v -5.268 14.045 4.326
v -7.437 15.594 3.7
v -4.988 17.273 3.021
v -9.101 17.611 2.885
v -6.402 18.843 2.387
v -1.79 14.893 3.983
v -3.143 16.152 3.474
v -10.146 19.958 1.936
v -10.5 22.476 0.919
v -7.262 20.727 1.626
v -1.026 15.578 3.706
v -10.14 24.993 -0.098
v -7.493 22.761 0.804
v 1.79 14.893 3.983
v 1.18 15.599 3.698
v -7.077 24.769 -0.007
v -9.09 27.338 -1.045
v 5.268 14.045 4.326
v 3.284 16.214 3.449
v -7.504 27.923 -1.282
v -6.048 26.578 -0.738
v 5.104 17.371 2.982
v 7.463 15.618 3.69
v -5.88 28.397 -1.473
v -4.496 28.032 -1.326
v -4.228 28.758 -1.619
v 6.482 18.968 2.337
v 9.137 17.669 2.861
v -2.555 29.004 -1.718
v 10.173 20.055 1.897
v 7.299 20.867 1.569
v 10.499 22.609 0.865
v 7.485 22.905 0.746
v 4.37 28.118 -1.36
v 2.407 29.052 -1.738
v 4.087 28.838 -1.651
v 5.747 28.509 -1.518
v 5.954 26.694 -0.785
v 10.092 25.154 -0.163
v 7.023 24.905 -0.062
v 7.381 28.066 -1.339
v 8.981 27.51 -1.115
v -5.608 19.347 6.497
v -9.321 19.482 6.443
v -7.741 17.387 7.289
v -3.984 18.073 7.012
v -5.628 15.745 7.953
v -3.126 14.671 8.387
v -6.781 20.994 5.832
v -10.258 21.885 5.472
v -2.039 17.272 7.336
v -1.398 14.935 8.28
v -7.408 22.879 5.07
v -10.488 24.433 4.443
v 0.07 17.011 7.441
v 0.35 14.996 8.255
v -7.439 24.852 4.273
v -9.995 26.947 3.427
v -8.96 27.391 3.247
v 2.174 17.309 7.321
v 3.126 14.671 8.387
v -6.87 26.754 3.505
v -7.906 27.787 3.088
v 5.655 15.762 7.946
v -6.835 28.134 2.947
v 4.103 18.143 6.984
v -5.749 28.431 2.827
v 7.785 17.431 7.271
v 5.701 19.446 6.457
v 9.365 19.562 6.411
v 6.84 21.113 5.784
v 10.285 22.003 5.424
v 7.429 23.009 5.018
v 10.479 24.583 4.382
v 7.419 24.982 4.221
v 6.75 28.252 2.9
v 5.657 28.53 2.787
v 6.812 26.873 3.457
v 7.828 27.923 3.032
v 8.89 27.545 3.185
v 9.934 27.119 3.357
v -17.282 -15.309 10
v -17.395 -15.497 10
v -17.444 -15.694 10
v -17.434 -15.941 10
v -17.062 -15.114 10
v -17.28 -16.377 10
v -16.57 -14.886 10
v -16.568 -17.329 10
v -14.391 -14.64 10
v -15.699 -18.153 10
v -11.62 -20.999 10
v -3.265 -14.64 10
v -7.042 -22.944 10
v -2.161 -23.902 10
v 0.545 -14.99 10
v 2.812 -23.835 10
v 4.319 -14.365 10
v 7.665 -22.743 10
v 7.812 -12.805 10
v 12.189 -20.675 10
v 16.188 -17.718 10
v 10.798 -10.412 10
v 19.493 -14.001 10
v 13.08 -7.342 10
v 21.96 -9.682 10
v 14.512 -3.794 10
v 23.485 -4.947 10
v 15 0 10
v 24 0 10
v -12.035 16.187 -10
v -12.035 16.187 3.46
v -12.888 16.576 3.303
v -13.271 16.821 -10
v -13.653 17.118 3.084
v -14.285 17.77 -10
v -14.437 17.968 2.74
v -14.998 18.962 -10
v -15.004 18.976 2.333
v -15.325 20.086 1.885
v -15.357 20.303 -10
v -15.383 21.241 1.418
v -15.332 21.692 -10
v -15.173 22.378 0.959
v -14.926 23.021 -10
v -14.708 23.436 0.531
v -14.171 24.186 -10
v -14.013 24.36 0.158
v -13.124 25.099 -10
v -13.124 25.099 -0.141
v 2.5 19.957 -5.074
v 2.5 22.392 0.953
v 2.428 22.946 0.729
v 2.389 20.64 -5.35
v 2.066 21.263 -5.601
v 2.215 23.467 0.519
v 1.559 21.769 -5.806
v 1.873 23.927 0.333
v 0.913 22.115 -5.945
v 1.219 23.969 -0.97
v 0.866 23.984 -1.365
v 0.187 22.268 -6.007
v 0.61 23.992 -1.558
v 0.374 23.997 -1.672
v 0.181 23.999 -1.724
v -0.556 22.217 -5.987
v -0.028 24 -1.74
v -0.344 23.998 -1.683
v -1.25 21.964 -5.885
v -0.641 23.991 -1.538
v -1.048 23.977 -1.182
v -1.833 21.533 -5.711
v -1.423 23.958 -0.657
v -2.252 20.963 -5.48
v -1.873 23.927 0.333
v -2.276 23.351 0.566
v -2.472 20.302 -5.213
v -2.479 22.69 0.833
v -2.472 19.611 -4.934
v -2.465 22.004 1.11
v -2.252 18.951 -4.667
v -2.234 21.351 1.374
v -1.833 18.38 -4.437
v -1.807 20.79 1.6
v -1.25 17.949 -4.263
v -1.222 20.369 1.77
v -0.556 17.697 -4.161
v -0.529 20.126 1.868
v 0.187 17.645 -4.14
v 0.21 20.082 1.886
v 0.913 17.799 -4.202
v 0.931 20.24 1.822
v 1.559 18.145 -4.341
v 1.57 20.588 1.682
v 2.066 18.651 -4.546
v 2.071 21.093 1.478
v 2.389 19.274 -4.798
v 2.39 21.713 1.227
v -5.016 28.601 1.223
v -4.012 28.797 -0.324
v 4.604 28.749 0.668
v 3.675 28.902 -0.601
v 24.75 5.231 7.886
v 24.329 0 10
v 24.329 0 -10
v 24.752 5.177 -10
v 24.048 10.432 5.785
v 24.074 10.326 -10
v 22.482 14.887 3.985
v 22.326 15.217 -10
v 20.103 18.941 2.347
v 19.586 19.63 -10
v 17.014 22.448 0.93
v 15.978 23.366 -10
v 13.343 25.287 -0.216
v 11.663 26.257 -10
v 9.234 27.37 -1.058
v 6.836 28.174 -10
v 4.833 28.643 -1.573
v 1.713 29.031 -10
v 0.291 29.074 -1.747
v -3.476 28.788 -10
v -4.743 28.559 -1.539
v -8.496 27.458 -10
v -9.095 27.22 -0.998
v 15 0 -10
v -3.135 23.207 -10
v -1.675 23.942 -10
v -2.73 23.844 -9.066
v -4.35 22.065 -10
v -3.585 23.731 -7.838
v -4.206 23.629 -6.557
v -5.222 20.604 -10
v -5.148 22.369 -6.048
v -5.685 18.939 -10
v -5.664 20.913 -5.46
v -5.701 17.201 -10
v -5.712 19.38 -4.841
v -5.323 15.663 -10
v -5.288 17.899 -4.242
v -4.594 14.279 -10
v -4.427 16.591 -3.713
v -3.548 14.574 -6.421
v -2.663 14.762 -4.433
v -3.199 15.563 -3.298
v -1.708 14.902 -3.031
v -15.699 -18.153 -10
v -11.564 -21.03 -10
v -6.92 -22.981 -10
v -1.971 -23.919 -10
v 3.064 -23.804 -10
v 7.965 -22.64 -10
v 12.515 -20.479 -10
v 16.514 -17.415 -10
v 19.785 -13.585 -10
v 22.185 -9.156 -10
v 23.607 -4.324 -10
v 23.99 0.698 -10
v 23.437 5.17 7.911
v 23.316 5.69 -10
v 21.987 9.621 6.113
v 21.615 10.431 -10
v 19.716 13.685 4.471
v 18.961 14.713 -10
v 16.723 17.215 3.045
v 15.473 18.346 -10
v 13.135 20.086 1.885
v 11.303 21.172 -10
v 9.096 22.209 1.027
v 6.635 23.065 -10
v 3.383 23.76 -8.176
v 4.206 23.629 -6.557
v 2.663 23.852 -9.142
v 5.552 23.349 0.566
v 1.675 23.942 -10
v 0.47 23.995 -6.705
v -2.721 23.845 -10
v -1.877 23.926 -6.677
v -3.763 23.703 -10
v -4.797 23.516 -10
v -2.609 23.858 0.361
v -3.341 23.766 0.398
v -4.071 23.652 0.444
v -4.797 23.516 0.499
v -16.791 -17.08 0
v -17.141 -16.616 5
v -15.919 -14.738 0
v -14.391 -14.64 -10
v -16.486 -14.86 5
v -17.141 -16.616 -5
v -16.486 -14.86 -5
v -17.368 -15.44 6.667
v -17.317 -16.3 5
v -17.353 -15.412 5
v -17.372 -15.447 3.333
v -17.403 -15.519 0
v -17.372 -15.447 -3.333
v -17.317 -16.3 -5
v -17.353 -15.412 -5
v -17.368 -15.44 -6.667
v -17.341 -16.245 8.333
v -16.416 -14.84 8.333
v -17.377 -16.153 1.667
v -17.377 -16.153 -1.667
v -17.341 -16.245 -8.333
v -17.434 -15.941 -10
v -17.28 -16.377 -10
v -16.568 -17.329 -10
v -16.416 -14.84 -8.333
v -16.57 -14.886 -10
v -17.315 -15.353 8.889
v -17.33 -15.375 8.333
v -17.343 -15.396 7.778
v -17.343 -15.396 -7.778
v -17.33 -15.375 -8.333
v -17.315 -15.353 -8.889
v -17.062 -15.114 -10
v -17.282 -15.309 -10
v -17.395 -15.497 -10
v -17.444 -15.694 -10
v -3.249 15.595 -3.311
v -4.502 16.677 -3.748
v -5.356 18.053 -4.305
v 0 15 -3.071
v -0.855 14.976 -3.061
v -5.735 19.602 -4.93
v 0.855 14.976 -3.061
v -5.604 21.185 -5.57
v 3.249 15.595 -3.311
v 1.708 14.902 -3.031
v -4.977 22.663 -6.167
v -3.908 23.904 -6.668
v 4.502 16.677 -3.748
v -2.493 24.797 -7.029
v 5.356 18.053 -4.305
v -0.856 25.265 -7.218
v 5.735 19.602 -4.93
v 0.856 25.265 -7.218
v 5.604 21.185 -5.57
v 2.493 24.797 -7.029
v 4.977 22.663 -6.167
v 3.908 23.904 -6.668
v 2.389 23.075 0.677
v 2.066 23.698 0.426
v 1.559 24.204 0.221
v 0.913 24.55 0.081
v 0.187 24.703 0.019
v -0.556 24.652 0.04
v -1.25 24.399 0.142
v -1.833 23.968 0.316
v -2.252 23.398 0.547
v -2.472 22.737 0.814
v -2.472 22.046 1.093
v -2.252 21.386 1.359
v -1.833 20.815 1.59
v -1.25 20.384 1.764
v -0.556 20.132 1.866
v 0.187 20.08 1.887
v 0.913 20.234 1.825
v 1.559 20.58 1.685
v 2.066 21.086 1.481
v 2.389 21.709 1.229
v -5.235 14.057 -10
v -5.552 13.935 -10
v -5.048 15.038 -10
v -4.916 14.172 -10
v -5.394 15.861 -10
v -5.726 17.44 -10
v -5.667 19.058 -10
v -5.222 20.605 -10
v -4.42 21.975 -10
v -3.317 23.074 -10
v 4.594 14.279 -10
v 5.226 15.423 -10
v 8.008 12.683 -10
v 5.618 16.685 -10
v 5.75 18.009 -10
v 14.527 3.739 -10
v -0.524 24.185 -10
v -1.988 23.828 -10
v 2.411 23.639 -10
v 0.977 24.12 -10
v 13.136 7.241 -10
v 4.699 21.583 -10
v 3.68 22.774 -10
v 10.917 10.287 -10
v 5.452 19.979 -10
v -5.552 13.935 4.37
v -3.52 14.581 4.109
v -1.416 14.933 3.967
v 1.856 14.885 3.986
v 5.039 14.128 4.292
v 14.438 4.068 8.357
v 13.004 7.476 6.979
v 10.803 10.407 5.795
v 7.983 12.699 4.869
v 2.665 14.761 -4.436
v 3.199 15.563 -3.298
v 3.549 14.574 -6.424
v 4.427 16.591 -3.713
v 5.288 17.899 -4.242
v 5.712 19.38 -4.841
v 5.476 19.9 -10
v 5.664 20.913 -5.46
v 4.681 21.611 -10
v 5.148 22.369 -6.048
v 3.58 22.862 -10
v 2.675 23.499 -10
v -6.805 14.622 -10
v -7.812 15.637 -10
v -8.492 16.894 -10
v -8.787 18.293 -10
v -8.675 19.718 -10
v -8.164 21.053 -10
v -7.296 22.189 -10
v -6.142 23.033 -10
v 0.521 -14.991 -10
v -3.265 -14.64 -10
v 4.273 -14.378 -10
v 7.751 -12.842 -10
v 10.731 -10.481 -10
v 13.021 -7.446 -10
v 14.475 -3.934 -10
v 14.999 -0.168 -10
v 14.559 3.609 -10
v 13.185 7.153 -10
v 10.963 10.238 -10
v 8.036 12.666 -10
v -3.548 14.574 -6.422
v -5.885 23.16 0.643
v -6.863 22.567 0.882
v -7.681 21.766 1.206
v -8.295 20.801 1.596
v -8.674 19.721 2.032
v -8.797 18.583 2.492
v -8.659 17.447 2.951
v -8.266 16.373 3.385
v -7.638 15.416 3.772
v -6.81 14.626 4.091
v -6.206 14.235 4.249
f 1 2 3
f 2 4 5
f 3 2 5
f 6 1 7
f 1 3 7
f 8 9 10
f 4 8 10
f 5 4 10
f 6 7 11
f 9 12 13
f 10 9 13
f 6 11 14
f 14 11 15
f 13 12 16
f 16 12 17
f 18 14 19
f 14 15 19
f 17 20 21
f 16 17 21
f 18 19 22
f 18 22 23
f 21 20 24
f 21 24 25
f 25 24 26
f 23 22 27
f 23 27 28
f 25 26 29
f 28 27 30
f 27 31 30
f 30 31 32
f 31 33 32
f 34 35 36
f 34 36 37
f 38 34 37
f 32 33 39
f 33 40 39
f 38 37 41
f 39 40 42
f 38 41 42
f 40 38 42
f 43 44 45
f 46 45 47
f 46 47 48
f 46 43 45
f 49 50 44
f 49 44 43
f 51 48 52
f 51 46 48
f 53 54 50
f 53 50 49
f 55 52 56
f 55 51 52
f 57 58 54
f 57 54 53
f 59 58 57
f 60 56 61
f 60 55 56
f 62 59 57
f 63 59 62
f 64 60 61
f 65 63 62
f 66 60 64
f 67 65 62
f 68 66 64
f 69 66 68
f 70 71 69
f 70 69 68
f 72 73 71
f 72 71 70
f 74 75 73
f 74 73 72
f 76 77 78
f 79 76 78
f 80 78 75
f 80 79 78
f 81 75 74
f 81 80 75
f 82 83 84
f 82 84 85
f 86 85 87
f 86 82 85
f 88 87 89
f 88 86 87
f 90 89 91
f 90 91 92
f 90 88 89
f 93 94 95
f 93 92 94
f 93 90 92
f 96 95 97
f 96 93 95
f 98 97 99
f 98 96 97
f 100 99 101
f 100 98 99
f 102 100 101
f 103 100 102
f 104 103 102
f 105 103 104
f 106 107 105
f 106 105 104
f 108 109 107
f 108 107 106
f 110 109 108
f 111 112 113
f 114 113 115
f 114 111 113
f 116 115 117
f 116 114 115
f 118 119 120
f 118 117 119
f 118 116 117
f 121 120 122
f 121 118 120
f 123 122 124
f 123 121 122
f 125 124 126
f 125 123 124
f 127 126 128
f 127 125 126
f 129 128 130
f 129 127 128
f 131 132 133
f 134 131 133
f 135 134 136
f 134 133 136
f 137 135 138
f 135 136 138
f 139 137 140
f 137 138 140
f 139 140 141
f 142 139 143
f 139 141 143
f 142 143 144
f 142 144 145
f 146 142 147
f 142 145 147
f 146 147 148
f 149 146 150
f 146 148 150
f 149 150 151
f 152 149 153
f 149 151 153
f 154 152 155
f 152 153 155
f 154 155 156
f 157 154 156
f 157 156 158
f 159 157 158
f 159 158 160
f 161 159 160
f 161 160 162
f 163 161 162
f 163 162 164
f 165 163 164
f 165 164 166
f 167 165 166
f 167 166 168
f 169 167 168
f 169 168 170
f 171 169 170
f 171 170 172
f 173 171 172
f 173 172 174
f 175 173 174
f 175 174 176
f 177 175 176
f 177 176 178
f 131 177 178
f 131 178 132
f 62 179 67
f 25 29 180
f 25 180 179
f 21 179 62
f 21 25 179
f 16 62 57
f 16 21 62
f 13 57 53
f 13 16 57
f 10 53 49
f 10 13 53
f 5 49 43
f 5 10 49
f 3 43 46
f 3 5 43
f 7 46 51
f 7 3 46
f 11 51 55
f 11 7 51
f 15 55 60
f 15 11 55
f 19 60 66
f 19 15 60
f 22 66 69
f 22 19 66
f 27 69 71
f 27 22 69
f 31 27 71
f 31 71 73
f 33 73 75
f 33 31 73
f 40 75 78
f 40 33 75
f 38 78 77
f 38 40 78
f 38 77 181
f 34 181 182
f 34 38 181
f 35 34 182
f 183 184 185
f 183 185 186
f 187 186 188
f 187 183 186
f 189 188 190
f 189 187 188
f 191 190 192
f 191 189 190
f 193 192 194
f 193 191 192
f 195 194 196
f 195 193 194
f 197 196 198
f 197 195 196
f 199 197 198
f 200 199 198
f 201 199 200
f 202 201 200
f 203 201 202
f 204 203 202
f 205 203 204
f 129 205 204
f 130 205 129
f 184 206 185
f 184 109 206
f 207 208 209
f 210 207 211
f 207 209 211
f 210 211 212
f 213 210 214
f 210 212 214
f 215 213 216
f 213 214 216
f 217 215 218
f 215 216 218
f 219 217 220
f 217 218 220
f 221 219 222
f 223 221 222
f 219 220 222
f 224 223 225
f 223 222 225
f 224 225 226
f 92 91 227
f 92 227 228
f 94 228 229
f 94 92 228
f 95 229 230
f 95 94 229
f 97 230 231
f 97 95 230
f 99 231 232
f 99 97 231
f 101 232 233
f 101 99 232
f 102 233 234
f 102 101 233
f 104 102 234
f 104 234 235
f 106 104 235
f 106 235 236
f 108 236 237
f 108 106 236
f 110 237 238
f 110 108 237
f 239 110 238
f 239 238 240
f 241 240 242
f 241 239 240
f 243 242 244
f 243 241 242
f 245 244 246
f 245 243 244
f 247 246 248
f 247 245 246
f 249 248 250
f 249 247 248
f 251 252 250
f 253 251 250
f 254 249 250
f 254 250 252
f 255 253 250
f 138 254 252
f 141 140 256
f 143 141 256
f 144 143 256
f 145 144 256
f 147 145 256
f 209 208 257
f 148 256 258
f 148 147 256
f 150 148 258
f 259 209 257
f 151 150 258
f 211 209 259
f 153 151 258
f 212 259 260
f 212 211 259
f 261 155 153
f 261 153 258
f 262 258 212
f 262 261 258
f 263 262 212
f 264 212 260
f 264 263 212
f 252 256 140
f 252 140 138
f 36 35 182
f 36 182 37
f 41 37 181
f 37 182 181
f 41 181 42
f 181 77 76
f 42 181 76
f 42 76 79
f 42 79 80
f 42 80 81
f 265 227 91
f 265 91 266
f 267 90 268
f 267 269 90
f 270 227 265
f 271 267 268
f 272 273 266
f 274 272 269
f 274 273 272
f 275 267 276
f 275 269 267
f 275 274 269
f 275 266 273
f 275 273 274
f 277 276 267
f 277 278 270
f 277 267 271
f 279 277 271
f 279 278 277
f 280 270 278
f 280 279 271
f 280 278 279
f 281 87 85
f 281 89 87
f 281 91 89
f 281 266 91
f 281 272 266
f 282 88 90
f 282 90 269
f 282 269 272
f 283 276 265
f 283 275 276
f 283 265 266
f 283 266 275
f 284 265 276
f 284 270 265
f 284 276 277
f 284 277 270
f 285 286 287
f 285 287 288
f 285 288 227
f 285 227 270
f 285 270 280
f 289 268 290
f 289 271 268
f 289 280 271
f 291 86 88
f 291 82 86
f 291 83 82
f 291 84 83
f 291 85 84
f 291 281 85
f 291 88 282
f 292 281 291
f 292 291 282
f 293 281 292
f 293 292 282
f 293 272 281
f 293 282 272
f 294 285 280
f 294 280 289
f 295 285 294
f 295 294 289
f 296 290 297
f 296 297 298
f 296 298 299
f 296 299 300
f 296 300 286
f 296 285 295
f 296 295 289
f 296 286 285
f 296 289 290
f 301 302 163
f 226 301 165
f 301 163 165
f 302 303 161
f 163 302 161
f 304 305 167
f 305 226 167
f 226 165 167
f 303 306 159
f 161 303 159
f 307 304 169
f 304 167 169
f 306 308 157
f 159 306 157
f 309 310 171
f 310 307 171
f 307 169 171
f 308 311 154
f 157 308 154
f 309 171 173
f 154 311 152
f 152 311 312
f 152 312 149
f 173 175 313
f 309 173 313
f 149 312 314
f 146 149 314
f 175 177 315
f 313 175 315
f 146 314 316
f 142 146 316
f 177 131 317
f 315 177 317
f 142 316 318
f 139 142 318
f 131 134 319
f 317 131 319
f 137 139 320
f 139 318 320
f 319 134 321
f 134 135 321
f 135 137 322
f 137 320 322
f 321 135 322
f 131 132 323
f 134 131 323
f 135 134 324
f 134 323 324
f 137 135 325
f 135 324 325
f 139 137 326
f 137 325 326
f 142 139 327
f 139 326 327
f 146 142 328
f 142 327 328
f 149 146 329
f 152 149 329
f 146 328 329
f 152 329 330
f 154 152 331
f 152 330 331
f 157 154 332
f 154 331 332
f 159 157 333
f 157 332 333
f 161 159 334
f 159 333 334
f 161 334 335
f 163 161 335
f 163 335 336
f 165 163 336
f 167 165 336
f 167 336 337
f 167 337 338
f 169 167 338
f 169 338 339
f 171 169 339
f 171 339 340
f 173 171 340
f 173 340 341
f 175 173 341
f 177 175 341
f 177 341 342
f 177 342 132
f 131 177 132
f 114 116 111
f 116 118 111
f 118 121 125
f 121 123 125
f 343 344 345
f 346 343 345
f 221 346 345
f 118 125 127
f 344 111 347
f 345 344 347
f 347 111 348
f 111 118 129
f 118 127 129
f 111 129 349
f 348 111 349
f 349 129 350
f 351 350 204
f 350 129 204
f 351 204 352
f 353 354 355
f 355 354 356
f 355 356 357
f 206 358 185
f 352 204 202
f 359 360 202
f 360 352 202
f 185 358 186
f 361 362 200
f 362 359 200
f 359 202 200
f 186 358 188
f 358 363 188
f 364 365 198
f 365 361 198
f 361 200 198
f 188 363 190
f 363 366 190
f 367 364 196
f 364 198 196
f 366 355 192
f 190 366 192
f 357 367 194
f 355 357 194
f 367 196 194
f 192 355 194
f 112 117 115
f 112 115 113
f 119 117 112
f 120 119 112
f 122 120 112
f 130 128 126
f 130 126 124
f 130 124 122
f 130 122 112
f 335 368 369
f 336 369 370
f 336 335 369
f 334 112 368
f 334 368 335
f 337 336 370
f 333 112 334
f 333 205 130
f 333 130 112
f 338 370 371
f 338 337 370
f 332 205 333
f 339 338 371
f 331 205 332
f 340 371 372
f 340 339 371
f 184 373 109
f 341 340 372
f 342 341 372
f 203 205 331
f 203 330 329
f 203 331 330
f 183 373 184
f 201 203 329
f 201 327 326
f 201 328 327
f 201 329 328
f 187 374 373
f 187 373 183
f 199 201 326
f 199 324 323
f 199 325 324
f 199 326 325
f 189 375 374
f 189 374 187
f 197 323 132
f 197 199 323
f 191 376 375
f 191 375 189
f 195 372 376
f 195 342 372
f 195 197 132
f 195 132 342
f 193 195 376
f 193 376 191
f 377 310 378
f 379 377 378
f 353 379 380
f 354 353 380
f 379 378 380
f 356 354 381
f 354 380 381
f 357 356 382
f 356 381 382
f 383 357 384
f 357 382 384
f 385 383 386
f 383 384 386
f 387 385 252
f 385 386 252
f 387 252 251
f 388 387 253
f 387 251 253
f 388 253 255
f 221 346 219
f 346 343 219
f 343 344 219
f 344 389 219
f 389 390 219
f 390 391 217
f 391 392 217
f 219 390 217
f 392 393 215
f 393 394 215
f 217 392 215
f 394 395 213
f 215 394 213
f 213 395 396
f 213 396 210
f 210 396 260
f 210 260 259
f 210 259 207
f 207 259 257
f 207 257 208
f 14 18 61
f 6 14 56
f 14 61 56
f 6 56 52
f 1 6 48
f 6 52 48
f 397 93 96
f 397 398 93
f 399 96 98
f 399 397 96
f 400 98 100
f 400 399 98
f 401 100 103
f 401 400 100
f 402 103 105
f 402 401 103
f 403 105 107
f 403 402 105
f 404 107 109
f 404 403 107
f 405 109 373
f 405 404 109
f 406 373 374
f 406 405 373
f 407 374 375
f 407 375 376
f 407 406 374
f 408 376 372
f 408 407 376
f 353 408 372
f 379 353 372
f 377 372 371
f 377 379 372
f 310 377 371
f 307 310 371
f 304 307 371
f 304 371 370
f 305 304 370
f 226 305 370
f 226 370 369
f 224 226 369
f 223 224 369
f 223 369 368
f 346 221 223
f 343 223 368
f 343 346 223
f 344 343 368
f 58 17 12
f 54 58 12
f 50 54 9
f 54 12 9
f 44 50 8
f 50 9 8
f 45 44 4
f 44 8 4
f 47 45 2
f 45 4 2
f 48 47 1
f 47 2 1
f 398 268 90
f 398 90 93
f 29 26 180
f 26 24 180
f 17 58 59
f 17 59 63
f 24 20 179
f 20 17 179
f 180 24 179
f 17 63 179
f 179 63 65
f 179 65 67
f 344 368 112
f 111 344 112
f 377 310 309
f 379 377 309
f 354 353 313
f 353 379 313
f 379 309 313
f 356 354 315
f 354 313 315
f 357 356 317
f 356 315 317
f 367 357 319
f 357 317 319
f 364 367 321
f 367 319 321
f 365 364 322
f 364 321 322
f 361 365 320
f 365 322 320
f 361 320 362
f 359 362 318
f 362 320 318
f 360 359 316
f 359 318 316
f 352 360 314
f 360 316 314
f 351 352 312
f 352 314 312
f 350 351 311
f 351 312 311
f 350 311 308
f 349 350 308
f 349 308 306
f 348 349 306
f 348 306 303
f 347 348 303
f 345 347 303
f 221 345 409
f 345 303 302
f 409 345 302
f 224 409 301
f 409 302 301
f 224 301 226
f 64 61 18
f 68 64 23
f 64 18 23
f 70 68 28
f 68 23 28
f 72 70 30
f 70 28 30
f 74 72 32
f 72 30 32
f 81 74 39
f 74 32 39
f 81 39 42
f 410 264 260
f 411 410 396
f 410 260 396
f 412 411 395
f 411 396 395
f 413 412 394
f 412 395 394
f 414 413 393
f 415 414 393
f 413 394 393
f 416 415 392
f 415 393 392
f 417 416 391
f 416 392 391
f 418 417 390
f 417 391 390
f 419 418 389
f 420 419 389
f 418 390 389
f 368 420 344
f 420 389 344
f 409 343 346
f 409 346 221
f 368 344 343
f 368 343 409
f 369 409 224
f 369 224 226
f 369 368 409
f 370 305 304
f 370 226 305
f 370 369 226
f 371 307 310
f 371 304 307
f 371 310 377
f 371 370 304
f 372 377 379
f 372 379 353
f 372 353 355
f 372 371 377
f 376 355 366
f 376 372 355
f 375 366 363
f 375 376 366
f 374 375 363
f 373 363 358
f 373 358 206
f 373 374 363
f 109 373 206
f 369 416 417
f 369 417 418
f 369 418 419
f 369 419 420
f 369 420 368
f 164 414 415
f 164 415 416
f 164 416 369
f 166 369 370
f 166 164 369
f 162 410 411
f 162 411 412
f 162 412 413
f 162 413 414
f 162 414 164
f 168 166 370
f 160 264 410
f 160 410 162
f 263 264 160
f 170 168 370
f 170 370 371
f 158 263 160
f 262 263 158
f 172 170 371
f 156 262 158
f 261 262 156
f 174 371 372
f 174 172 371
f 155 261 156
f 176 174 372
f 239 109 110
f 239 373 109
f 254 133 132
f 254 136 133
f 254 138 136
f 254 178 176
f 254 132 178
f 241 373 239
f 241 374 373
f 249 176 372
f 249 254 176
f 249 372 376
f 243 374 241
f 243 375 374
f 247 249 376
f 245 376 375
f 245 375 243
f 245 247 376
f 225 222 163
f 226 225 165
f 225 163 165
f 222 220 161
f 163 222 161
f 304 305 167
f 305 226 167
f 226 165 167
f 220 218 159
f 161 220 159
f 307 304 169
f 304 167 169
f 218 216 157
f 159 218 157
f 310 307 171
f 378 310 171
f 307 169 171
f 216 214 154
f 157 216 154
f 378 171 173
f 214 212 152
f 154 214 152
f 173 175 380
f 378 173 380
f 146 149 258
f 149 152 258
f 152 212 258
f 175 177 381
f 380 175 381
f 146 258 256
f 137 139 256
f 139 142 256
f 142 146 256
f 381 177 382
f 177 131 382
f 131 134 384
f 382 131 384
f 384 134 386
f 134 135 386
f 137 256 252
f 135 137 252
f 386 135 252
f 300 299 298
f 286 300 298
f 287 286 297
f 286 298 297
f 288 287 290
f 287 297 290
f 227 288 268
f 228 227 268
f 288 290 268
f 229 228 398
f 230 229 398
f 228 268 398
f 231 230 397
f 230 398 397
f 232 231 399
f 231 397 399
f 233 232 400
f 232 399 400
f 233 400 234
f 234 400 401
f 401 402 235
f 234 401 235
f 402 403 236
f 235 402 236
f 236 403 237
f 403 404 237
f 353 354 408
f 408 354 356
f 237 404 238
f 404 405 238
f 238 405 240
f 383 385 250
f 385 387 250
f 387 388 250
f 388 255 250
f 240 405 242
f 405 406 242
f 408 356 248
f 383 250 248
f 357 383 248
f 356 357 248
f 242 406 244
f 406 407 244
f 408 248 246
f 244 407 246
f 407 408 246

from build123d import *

# Parameters (mm, degrees)
F1_DEPTH       = 10
F2_R           = 24
F2_R_2         = 15
F3_DEPTH       = 10
F5_DEPTH       = 12.5
F6_W           = 22.41528593
F6_H           = 10.1995486766
F7_DEPTH       = 12.5
F12_W          = 51.7317093909
F12_H          = 35.3548980784
F13_DEPTH      = 25
F15_R          = 2.5
F16_DEPTH      = 15
F17_R          = 10.5
F17_R_2        = 7.5
F18_DEPTH      = 4
F19_W          = 61.2675081939
F19_H          = 44.7931201197
F20_DEPTH      = 12.5
F23_T1_DEPTH   = 57.6612211781
F23_2_T1_DEPTH = 77.2316796631
F24_T1_DEPTH   = 44.1608674747
F26_R          = 5.75
F27_DEPTH      = 3.5


# Not quite as in the source:
# - a fillet or chamfer that OpenCascade refuses, or shapes differently, is made with other operations: its cross-section is extruded or revolved along the edge and cut away or added


with BuildPart() as f1:
    # F0 (on Top) → F1 (new body, symmetric)
    with BuildSketch(Plane.XY):
        with BuildLine():
            Line((15, 0), (24.3292674422, 0))
            ThreePointArc((24.3292674422, 0), (0.2560960129, 29.0743140694), (-23.8170754164, 0))
            Line((-23.8170754164, 0), (-15, 0))
            ThreePointArc((-15, 0), (0, 15), (15, 0))
        make_face()
    extrude(amount=F1_DEPTH, both=True)


with BuildPart() as f3:
    # F2 (on Top) → F3 (new body, symmetric)
    with BuildSketch(Plane.XY):
        Circle(F2_R)
        Circle(F2_R_2, mode=Mode.SUBTRACT)
    extrude(amount=F3_DEPTH, both=True)


with BuildPart() as f5:
    # F4 (on Top) → F5 (new body, symmetric)
    with BuildSketch(Plane.XY):
        Polygon((-14.9477146361, -14.5601387329), (-5.1014113761, 13.7780036218), (-24.9381110243, 20.6704159038), (-34.7844142843, -7.6677264509), align=None)
    extrude(amount=F5_DEPTH, both=True)


with BuildPart() as f7:
    # F6 (on Top) → F7 (new body, symmetric)
    with BuildSketch(Plane.XY):
        with Locations((-12.919315137, -9.5406156033)):
            Rectangle(F6_W, F6_H)
    extrude(amount=F7_DEPTH, both=True)


with BuildPart() as f1_1:
    add(f1.part)

    # F8: cut F5, F7
    add(f5.part, mode=Mode.SUBTRACT)
    add(f7.part, mode=Mode.SUBTRACT)


with BuildPart() as f3_1:
    add(f3.part)

    # F8: cut F5, F7
    add(f5.part, mode=Mode.SUBTRACT)
    add(f7.part, mode=Mode.SUBTRACT)


with BuildPart() as f13:
    # F12 (on face) → F13 (new body)
    with BuildSketch(Plane(origin=(0, 3.4732918523, 8.5966990017), x_dir=(1, 0, 0), z_dir=(0, 0.3746065934, 0.9271838546))):
        with Locations((1.7926823348, 13.7932781363)):
            Rectangle(F12_W, F12_H)
    extrude(amount=F13_DEPTH)


with BuildPart() as f3_2:
    add(f3_1.part)

    # F14: cut F13
    add(f13.part, mode=Mode.SUBTRACT)


with BuildPart() as f1_2:
    add(f1_1.part)

    # F14: cut F13
    add(f13.part, mode=Mode.SUBTRACT)


with BuildPart() as f16:
    # F15 (on face) → F16 (new body)
    with BuildSketch(Plane(origin=(0, 3.4732918523, 8.5966990017), x_dir=(1, 0, 0), z_dir=(0, 0.3746065934, 0.9271838546))):
        with Locations((0, 20.4042736441)):
            Circle(F15_R)
    extrude(amount=-F16_DEPTH)


with BuildPart() as f18:
    # F17 (on face) → F18 (new body)
    with BuildSketch(Plane(origin=(0, 3.4732918523, 8.5966990017), x_dir=(1, 0, 0), z_dir=(0, 0.3746065934, 0.9271838546))):
        with Locations((0, 20.4843599349)):
            Circle(F17_R)
        with Locations((0, 20.4843599349)):
            Circle(F17_R_2, mode=Mode.SUBTRACT)
    extrude(amount=F18_DEPTH)


with BuildPart() as f20:
    # F19 (on Top) → F20 (new body, symmetric)
    with BuildSketch(Plane.XY):
        with Locations((-0.9692432359, 18.0722444784)):
            Rectangle(F19_W, F19_H)
        with BuildLine():
            Line((24.173, 0), (15, 0))
            ThreePointArc((15, 0), (0, 15), (-15, 0))
            Line((-15, 0), (-23.85, 0))
            ThreePointArc((-23.85, 0), (0.1615, 29.1552502712), (24.173, 0))
        make_face(mode=Mode.SUBTRACT)
    extrude(amount=F20_DEPTH, both=True)


with BuildPart() as f18_1:
    add(f18.part)

    # F21: cut F20
    add(f20.part, mode=Mode.SUBTRACT)


with BuildPart() as f1_3:
    add(f1_2.part)

    # F22: cut F16
    add(f16.part, mode=Mode.SUBTRACT)

    # F23: fillet of radius 5 on 1 edges, made by hand

    # F23_s2 → F23_t1 (cut)
    with BuildSketch(Plane.XY.offset(-32.6361921936)):
        with BuildLine():
            ThreePointArc((-12.0346234612, 16.1870009336), (-15.3566437884, 20.3034543546), (-13.1237951218, 25.0988057133))
            ThreePointArc((-13.1237951218, 25.0988057133), (-16.6861637402, 22.273317734), (-19.6651630599, 18.8382899979))
            Line((-19.6651630599, 18.8382899979), (-12.0346234612, 16.1870009336))
        make_face()
    extrude(amount=F23_T1_DEPTH, mode=Mode.SUBTRACT)


with BuildPart() as f3_3:
    add(f3_2.part)

    # F22: cut F16
    add(f16.part, mode=Mode.SUBTRACT)

    # F23#2: fillet of radius 5 on 1 edges, made by hand

    # F23_2_s2 → F23_2_t1 (cut)
    with BuildSketch(Plane.XY.offset(-42.1822661383)):
        with BuildLine():
            ThreePointArc((-4.7968588028, 23.5157425064), (-8.7820491741, 19.009568806), (-5.5521549108, 13.9346178938))
            Line((-5.5521549108, 13.9346178938), (-16.2579553104, 17.654429731))
            ThreePointArc((-16.2579553104, 17.654429731), (-10.9277191672, 21.3678486002), (-4.7968588028, 23.5157425064))
        make_face()
    extrude(amount=F23_2_T1_DEPTH, mode=Mode.SUBTRACT)

    # F24: fillet of radius 2 on 1 edges, made by hand

    # F24_s2 → F24_t1 (cut)
    with BuildSketch(Plane.XY.offset(-22.0804337374)):
        with BuildLine():
            add(Edge.make_bspline(
                [(-15.6991416444, -18.1531526636), (-19.7610018026, -14.6403899416), (-14.3908798407, -14.6403899416)],
                knots=[0, 0, 0, 1, 1, 1], degree=2, weights=[1, 1, 1]))
            Line((-14.3908798407, -14.6403899416), (-19.0173337342, -14.6403899416))
            ThreePointArc((-19.0173337342, -14.6403899416), (-17.4468705264, -16.4804947995), (-15.6991416444, -18.1531526636))
        make_face()
    extrude(amount=F24_T1_DEPTH, mode=Mode.SUBTRACT)


with BuildPart() as f27:
    # F26 (on offset) → F27 (new body, symmetric)
    with BuildSketch(Plane(origin=(0, -0.2727740819, -0.675139544), x_dir=(1, 0, 0), z_dir=(0, 0.3746065934, 0.9271838546))):
        with Locations((0, 20.4434879124)):
            Circle(F26_R)
    extrude(amount=F27_DEPTH, both=True)


with BuildPart() as f1_4:
    add(f1_3.part)

    # F28: cut F27
    add(f27.part, mode=Mode.SUBTRACT)


with BuildPart() as f3_4:
    add(f3_3.part)

    # F28: cut F27
    add(f27.part, mode=Mode.SUBTRACT)


solid = Compound([f18_1.part, f1_4.part, f3_4.part])
